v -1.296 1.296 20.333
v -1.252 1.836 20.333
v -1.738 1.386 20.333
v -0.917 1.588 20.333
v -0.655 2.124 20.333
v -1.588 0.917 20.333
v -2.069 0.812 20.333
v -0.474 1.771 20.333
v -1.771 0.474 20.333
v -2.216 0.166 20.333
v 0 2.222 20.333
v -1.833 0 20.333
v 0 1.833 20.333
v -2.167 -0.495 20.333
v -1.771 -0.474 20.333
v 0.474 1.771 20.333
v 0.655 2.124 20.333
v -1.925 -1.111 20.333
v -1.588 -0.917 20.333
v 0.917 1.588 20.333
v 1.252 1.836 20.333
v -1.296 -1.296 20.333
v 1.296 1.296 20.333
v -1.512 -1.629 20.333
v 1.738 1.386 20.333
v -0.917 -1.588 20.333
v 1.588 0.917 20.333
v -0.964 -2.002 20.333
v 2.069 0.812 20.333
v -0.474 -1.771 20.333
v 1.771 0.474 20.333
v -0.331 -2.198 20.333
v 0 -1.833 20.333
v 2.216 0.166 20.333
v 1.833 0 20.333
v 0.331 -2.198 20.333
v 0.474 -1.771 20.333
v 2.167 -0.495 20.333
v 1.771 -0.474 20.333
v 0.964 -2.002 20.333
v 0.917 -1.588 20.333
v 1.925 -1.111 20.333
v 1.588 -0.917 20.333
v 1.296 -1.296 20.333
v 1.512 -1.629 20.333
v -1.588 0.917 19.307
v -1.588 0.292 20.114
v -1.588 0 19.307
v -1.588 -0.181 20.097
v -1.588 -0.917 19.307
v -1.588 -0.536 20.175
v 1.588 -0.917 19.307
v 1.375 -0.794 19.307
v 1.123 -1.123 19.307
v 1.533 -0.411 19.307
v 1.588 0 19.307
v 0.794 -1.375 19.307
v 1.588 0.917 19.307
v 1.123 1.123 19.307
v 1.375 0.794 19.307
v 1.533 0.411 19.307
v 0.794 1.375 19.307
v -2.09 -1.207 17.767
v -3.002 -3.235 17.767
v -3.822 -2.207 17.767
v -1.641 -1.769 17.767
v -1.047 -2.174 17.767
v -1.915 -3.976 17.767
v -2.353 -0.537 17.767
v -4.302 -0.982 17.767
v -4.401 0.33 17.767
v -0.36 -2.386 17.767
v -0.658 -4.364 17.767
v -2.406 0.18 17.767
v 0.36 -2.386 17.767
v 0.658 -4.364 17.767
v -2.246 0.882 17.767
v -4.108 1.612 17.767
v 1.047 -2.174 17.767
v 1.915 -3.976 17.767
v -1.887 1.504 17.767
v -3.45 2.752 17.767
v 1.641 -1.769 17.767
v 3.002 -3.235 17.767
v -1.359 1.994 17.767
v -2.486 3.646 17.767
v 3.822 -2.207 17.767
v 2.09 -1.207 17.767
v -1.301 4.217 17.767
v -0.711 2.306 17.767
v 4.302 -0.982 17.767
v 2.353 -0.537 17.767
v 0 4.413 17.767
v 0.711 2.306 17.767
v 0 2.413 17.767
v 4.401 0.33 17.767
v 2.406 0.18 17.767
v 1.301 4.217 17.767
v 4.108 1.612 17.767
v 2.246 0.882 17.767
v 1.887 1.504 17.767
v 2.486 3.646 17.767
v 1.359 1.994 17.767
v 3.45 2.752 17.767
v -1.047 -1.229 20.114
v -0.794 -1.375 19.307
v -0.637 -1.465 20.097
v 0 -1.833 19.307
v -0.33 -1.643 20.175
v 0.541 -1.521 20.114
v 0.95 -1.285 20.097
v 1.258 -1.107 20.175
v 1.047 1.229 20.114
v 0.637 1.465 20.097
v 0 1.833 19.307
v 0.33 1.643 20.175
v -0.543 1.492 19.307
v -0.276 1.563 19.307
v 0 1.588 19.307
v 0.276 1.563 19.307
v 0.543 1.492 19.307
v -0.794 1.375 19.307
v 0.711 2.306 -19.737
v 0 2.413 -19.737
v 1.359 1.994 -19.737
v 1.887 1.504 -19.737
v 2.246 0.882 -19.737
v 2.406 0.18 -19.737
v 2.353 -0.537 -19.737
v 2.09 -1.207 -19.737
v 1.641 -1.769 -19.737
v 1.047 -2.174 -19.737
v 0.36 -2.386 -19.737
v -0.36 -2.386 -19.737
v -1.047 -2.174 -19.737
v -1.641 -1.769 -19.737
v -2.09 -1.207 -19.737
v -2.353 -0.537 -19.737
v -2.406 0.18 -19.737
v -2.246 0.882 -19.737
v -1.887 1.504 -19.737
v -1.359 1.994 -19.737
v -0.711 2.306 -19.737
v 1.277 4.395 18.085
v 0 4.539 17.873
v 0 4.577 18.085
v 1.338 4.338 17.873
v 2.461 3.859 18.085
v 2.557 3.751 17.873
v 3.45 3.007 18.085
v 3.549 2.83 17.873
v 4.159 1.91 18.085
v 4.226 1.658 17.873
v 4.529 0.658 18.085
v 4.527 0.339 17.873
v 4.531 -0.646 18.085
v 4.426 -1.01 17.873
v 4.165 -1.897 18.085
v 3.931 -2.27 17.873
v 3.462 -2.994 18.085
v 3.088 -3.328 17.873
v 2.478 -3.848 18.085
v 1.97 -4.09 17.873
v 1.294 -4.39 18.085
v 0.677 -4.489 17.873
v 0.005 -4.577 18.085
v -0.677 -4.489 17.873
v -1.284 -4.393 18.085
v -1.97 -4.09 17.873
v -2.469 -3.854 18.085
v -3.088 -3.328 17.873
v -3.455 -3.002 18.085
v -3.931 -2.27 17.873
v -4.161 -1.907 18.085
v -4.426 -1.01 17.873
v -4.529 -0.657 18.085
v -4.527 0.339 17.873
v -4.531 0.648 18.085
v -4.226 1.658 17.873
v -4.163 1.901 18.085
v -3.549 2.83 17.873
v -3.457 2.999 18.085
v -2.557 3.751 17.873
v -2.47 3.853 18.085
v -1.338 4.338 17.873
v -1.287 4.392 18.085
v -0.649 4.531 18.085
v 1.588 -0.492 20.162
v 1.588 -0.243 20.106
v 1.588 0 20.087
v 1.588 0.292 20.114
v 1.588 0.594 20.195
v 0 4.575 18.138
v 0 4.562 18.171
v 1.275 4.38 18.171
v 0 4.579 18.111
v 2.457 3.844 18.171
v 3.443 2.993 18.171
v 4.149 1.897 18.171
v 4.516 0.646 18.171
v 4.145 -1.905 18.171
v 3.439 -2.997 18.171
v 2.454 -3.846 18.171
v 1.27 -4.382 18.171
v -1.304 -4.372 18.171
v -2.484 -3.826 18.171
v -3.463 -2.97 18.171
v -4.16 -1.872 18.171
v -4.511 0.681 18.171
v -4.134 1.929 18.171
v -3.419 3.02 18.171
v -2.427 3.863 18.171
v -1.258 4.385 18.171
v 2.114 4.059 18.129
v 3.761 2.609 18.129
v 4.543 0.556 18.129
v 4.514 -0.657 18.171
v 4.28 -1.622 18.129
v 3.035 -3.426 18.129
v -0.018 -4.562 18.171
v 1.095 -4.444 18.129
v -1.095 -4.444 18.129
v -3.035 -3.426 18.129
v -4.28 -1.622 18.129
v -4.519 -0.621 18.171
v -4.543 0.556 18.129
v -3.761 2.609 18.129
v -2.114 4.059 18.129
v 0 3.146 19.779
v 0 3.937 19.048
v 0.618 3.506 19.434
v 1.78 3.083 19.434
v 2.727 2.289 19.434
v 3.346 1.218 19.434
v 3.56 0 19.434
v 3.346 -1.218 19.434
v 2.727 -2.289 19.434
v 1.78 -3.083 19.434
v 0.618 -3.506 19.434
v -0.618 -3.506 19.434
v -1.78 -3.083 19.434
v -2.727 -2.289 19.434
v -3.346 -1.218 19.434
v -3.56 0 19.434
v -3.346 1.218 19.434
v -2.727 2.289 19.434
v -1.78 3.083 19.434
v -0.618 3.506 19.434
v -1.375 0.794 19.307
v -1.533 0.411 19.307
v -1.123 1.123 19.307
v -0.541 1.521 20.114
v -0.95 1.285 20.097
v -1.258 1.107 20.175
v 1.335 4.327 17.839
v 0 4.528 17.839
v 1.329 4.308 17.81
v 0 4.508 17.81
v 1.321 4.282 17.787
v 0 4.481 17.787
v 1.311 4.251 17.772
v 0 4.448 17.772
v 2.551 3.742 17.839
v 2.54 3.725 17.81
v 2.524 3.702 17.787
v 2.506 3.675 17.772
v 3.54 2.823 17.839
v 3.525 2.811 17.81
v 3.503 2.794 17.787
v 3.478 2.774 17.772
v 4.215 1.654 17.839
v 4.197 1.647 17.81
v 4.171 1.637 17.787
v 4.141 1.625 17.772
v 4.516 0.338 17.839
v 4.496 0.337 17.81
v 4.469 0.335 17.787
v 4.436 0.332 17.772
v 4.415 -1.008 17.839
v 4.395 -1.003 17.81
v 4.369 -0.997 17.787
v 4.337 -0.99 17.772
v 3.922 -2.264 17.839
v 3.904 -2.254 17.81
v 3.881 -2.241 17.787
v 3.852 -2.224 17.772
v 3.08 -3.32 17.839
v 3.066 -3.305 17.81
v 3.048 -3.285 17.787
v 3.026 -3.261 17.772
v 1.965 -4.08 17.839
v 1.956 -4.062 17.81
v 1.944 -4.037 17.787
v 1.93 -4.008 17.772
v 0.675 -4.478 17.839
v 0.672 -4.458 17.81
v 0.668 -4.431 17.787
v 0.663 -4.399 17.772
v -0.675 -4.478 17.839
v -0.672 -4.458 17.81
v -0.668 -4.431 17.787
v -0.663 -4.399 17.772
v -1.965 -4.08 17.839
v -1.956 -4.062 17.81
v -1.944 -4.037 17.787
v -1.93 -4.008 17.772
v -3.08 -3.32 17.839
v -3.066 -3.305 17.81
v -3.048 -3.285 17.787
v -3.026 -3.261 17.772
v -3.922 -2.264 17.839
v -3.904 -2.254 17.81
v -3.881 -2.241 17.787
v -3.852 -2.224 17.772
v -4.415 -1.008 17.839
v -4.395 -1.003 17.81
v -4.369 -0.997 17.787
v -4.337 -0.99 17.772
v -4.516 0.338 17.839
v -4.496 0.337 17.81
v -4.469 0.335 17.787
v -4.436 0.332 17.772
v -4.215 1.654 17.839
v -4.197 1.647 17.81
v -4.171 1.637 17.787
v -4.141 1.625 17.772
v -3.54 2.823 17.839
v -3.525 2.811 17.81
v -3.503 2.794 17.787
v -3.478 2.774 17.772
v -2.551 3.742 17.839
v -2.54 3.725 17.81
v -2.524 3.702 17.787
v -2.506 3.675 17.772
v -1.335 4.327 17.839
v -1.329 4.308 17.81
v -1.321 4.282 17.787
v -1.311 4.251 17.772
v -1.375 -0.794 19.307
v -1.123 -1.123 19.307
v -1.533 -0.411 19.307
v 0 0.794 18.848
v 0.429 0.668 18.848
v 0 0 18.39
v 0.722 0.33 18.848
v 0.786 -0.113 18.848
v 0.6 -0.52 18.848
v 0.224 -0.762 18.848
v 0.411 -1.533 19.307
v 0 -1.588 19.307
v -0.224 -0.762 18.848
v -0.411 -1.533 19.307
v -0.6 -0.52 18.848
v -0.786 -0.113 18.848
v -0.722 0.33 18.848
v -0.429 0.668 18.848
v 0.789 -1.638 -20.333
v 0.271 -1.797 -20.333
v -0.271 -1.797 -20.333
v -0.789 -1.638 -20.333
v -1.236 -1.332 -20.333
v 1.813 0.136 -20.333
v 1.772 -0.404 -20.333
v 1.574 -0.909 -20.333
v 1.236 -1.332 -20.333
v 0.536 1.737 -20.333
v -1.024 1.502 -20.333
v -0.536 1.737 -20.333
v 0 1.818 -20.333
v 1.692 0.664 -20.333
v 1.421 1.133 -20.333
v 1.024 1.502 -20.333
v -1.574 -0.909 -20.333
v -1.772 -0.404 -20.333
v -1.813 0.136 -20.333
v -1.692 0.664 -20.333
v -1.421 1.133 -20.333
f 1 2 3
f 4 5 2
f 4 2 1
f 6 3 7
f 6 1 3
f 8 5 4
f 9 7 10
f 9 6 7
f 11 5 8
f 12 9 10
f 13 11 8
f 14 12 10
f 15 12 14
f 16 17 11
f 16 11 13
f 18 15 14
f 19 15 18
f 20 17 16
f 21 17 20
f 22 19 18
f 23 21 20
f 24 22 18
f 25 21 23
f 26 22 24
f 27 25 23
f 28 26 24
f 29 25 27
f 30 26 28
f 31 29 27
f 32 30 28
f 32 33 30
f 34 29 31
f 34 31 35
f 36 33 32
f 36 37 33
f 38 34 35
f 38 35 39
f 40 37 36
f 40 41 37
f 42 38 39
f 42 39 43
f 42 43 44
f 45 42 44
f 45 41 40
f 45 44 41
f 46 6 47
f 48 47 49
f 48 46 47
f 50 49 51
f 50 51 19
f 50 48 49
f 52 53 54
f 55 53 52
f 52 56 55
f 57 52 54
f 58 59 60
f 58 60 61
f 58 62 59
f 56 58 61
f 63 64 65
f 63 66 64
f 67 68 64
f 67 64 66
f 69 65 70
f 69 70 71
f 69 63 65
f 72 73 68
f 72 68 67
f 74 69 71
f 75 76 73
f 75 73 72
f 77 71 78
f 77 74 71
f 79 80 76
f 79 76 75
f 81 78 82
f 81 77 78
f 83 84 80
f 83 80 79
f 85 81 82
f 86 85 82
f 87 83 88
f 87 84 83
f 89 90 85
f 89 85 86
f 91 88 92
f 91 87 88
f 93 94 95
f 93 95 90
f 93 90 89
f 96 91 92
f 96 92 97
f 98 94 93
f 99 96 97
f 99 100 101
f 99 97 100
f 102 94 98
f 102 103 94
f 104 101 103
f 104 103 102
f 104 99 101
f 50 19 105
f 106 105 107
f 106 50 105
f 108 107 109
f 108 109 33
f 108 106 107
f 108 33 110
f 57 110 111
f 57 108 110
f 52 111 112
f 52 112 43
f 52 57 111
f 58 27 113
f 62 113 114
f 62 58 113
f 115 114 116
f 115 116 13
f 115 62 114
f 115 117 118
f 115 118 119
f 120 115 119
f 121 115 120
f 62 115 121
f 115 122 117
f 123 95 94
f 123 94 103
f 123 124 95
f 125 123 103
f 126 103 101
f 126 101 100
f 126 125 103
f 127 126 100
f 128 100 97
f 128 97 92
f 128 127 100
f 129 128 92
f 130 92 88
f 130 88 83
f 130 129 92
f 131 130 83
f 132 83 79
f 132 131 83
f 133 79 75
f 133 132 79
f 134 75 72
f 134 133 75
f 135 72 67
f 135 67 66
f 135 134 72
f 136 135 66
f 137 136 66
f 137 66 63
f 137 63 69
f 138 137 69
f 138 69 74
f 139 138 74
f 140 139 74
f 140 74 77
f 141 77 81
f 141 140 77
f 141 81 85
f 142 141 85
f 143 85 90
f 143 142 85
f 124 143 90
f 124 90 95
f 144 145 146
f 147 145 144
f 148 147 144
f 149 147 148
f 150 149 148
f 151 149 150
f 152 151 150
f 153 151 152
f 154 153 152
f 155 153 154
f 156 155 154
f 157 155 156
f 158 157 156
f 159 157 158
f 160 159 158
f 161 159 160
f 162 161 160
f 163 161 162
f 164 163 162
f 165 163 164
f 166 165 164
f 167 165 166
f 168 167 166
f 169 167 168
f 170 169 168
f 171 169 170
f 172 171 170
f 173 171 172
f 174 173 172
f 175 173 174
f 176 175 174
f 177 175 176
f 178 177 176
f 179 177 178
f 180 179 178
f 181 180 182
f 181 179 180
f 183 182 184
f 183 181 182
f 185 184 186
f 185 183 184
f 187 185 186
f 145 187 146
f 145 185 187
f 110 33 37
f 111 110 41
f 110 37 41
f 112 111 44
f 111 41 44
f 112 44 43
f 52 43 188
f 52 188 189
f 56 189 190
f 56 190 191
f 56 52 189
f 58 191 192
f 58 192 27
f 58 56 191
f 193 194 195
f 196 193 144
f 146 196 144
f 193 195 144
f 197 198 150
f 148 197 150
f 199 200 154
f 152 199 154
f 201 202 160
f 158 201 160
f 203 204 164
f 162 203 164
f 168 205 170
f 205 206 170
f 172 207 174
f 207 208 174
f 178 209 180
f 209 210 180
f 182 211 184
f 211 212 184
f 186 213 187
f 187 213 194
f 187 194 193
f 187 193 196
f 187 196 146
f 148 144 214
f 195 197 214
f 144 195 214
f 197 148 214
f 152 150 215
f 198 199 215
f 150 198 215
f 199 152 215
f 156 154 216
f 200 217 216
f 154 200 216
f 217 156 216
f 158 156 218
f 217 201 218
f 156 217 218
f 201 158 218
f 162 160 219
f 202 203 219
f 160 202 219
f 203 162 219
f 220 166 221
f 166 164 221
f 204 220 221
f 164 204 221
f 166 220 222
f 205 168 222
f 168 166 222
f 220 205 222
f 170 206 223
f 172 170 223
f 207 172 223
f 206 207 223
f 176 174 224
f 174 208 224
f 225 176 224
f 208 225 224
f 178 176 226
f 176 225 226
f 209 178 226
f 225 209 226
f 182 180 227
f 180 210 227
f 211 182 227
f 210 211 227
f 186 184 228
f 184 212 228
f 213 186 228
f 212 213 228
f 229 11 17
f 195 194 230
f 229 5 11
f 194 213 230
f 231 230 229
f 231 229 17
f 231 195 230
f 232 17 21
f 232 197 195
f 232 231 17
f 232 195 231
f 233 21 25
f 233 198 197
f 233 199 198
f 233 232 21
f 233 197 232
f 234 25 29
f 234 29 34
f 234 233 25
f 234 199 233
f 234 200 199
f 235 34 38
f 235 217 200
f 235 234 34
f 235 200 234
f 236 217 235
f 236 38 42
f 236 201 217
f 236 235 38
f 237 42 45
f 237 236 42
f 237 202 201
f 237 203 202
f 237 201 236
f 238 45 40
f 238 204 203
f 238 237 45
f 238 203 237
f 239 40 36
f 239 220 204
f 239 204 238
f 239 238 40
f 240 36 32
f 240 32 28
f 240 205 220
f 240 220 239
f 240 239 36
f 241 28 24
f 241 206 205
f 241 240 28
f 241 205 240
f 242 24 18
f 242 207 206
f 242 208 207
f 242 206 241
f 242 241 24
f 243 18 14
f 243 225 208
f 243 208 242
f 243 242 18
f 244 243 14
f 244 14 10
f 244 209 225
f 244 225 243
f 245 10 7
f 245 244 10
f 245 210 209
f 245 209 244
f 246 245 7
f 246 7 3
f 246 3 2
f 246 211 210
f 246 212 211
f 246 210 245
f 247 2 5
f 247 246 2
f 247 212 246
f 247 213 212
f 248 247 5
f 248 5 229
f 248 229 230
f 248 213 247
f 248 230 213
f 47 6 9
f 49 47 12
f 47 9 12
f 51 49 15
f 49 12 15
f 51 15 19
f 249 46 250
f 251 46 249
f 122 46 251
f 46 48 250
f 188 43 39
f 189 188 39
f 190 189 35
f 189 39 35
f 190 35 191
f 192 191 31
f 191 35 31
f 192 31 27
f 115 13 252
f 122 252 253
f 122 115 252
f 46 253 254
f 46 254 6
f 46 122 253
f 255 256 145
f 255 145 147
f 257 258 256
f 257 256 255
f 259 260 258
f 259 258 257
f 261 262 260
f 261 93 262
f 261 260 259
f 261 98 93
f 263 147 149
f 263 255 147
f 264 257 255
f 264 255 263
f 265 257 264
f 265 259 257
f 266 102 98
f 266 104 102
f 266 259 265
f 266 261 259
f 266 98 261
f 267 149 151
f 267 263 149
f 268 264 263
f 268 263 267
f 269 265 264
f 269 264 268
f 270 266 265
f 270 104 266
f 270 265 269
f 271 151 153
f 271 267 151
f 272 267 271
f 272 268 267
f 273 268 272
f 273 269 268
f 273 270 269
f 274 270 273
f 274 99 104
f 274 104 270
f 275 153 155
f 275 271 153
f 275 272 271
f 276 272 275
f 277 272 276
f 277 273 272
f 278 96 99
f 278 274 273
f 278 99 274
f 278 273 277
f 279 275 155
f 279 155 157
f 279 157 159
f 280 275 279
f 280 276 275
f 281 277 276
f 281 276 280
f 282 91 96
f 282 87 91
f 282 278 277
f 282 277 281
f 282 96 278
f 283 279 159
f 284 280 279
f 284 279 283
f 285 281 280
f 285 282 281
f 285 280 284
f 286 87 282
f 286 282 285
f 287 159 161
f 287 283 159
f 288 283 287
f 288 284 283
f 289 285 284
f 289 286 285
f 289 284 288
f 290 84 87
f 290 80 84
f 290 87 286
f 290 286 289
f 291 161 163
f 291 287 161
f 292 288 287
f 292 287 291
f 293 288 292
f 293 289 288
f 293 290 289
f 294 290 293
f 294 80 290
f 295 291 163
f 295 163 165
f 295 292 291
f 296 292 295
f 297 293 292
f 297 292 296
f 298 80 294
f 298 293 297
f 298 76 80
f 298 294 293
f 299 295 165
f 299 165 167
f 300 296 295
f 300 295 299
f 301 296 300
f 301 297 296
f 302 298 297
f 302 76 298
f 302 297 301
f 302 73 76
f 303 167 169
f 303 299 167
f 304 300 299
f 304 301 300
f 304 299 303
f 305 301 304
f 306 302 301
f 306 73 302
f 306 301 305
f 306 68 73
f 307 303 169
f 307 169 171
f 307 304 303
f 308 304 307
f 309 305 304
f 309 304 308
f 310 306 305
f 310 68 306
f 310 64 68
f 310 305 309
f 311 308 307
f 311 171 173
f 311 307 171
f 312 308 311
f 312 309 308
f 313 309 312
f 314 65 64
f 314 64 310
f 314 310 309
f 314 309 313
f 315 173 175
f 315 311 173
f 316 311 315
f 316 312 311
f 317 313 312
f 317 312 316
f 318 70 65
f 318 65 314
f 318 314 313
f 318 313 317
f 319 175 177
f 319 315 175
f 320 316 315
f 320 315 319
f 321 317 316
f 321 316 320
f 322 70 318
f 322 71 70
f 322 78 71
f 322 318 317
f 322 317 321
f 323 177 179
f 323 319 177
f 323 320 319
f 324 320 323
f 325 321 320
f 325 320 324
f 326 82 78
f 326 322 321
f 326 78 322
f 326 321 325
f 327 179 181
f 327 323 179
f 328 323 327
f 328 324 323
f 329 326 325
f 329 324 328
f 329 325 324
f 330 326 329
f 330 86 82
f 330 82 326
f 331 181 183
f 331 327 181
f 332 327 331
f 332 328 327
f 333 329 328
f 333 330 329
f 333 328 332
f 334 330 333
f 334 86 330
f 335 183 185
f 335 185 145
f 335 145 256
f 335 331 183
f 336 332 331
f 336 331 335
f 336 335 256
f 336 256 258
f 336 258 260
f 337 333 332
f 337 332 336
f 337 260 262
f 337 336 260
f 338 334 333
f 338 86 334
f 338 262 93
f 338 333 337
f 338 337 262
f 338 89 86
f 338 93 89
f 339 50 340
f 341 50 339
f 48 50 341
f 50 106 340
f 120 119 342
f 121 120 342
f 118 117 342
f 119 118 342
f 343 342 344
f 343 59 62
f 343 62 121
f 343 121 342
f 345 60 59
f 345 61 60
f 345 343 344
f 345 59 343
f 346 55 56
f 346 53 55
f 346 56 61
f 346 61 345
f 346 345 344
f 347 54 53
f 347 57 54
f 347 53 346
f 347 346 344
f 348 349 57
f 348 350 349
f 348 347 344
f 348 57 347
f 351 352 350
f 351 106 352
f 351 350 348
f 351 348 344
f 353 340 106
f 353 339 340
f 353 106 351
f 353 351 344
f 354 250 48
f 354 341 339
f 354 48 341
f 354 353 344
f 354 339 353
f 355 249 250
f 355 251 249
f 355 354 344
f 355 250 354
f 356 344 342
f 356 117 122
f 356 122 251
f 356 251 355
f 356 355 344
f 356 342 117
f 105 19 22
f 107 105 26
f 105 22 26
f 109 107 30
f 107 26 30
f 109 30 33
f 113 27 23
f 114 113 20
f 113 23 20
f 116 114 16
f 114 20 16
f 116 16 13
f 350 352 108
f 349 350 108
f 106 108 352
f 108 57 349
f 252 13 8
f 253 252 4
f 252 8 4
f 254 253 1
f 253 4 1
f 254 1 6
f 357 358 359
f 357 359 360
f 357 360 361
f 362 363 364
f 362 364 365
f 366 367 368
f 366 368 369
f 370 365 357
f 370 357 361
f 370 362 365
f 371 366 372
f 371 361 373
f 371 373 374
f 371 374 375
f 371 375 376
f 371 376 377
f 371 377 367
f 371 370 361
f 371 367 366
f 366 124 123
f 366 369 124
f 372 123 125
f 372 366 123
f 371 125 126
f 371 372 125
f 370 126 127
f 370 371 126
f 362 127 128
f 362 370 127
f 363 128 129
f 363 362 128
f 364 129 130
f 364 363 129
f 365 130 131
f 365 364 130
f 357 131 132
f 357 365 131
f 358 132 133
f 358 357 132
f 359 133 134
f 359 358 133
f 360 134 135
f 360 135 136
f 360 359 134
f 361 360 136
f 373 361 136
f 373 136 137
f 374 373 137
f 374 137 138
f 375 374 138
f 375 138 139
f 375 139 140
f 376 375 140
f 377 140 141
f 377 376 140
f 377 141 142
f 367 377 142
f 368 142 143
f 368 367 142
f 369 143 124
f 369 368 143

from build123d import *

# Parameters (mm, degrees)
CUT_EXTRUDE1_START = 19.30654
CUT_EXTRUDE1_DEPTH = 2.02616
SKETCH4_R          = 1.833087105
CUT_EXTRUDE2_DEPTH = 1.02616
CUT_EXTRUDE2_DRAFT = -45
FILLET1_R          = 0.12827


with BuildPart() as part:
    # Sketch2 → Revolve1 (revolve)
    with BuildSketch(Plane(origin=(0, 0, 0), x_dir=(0, 0, -1), z_dir=(1, 0, 0))):
        with BuildLine():
            Line((-20.3327, 1.5875), (-20.3327, 2.2225))
            ThreePointArc((-20.3327, 2.2225), (-19.417752118, 3.57733025), (-18.130157143, 4.5847))
            Line((-18.130157143, 4.5847), (-17.7673, 4.520718496))
            Line((-17.7673, 4.520718496), (-17.7673, 2.413))
            Line((-17.7673, 2.413), (19.7373875, 2.413))
            Line((19.7373875, 2.413), (20.3327, 1.8176875))
            Line((20.3327, 1.8176875), (20.3327, 0))
            Line((20.3327, 0), (-18.389996448, 0))
            Line((-18.389996448, 0), (-19.30654, 1.5875))
            Line((-19.30654, 1.5875), (-20.3327, 1.5875))
        make_face()
    revolve(axis=Axis((0, 0, 20.3327), (0, 0, -1)))

    # Sketch3 → Cut-Extrude1 (cut, through all)
    with BuildSketch(Plane.XY.offset(CUT_EXTRUDE1_START)):
        Polygon((0, 1.833087105), (-1.5875, 0.916543552), (-1.5875, -0.916543552), (0, -1.833087105), (1.5875, -0.916543552), (1.5875, 0.916543552), align=None)
    extrude(amount=CUT_EXTRUDE1_DEPTH, mode=Mode.SUBTRACT)


with BuildPart() as cut_extrude2_tool:
    # Sketch4 → Cut-Extrude2 (with draft: the straight prism first)
    with BuildSketch(Plane.XY.offset(20.3327)):
        Circle(SKETCH4_R)
    extrude(amount=-CUT_EXTRUDE2_DEPTH)
    # Cut-Extrude2: the draft: its side faces are tilted about the plane it starts from
    cut_extrude2_sides = [cut_extrude2_tool.faces().sort_by_distance(p)[0] for p in [
        (-1.833087105, 0, 19.81962),
    ]]
    draft(cut_extrude2_sides, Plane.XY.offset(20.3327), CUT_EXTRUDE2_DRAFT)


with BuildPart() as part_1:
    add(part.part)

    # Cut-Extrude2: cut by cut_extrude2_tool
    add(cut_extrude2_tool.part, mode=Mode.SUBTRACT)

    # Fillet1
    fillet1_edges = [part_1.edges().sort_by_distance(p)[0] for p in [
        (0, -4.520718496, 17.7673),
        (0, -4.5847, 18.130157143),
    ]]
    fillet(fillet1_edges, radius=FILLET1_R)


solid = part_1.part
